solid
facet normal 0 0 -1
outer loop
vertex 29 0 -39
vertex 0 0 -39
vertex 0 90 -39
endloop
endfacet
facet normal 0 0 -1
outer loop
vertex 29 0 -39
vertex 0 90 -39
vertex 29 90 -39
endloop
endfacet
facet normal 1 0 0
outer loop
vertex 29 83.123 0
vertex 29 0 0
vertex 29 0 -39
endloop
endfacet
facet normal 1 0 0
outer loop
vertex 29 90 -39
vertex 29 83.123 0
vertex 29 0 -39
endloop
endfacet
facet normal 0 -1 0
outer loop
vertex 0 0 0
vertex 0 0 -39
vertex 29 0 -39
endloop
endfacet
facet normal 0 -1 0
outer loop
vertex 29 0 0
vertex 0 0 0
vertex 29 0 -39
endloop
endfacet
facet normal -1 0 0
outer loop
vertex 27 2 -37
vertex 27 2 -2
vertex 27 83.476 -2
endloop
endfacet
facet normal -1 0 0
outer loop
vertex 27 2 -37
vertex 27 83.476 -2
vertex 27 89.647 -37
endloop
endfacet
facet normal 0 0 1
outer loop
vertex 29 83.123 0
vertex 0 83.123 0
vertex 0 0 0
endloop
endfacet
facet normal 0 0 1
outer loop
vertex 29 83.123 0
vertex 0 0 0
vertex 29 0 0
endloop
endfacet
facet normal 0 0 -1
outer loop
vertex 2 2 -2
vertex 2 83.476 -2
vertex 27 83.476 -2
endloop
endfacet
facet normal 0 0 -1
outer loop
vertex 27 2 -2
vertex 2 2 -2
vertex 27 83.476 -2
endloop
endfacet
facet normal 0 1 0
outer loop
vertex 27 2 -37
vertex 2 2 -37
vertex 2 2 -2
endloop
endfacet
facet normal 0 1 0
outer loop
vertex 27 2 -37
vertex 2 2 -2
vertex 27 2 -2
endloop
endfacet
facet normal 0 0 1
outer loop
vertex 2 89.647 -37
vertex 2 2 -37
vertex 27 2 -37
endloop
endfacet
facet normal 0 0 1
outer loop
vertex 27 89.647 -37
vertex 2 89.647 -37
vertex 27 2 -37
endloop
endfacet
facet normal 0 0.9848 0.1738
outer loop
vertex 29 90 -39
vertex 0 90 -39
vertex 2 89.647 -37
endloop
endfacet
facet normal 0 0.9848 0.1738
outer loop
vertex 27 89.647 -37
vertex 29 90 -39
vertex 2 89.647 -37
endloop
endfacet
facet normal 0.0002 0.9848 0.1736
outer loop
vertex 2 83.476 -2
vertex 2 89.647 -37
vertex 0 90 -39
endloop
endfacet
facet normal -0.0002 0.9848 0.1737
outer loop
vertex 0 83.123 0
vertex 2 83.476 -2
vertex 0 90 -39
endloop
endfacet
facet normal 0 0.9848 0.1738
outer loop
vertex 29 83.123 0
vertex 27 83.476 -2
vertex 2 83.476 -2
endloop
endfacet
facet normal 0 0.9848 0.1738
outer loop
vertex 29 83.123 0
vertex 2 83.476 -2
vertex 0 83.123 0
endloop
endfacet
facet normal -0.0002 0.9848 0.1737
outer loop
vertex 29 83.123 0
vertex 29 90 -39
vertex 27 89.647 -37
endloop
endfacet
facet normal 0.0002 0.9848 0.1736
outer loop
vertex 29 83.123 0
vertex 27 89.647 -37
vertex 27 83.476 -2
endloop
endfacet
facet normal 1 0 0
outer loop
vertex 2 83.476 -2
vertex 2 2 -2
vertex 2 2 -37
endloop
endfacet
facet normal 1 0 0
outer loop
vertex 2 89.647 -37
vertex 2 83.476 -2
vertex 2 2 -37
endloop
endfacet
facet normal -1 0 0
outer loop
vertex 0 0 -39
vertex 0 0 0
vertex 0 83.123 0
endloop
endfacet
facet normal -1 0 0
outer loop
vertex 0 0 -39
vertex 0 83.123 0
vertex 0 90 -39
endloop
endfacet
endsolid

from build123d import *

# Parameters (mm, degrees)
SKETCH1_W               = 29
SKETCH1_H               = 39
BOSS_EXTRUDE1_DEPTH     = 90
SHELL1_T                = -2
CUT_EXTRUDE1_DEPTH      = 103.28391858
CUT_EXTRUDE1_DEPTH_BACK = 103.28391858


with BuildPart() as part:
    # Sketch1 → Boss-Extrude1 (new body)
    with BuildSketch(Plane(origin=(0, 0, 0), x_dir=(1, 0, 0), z_dir=(0, 1, 0))):
        with Locations((14.5, 19.5)):
            Rectangle(SKETCH1_W, SKETCH1_H)
    extrude(amount=BOSS_EXTRUDE1_DEPTH)

    # Shell1
    shell1_openings = [part.faces().sort_by_distance(p)[0] for p in [
        (14.5, 90, -19.5),
    ]]
    offset(amount=SHELL1_T, openings=shell1_openings, kind=Kind.INTERSECTION)

    # Sketch3 → Cut-Extrude1 (cut, two sides: drawn at the far end of the back side and taken through both)
    with BuildSketch(Plane.ZY.offset(-CUT_EXTRUDE1_DEPTH_BACK)):
        Polygon((-242.041155587, 125.801633924), (-39, 90), (0, 83.123247752), (203.041155587, 47.321613828), (274.644423436, 453.403925002), (-170.437887739, 531.883945099), align=None)
    extrude(amount=CUT_EXTRUDE1_DEPTH + CUT_EXTRUDE1_DEPTH_BACK, mode=Mode.SUBTRACT)


solid = part.part
